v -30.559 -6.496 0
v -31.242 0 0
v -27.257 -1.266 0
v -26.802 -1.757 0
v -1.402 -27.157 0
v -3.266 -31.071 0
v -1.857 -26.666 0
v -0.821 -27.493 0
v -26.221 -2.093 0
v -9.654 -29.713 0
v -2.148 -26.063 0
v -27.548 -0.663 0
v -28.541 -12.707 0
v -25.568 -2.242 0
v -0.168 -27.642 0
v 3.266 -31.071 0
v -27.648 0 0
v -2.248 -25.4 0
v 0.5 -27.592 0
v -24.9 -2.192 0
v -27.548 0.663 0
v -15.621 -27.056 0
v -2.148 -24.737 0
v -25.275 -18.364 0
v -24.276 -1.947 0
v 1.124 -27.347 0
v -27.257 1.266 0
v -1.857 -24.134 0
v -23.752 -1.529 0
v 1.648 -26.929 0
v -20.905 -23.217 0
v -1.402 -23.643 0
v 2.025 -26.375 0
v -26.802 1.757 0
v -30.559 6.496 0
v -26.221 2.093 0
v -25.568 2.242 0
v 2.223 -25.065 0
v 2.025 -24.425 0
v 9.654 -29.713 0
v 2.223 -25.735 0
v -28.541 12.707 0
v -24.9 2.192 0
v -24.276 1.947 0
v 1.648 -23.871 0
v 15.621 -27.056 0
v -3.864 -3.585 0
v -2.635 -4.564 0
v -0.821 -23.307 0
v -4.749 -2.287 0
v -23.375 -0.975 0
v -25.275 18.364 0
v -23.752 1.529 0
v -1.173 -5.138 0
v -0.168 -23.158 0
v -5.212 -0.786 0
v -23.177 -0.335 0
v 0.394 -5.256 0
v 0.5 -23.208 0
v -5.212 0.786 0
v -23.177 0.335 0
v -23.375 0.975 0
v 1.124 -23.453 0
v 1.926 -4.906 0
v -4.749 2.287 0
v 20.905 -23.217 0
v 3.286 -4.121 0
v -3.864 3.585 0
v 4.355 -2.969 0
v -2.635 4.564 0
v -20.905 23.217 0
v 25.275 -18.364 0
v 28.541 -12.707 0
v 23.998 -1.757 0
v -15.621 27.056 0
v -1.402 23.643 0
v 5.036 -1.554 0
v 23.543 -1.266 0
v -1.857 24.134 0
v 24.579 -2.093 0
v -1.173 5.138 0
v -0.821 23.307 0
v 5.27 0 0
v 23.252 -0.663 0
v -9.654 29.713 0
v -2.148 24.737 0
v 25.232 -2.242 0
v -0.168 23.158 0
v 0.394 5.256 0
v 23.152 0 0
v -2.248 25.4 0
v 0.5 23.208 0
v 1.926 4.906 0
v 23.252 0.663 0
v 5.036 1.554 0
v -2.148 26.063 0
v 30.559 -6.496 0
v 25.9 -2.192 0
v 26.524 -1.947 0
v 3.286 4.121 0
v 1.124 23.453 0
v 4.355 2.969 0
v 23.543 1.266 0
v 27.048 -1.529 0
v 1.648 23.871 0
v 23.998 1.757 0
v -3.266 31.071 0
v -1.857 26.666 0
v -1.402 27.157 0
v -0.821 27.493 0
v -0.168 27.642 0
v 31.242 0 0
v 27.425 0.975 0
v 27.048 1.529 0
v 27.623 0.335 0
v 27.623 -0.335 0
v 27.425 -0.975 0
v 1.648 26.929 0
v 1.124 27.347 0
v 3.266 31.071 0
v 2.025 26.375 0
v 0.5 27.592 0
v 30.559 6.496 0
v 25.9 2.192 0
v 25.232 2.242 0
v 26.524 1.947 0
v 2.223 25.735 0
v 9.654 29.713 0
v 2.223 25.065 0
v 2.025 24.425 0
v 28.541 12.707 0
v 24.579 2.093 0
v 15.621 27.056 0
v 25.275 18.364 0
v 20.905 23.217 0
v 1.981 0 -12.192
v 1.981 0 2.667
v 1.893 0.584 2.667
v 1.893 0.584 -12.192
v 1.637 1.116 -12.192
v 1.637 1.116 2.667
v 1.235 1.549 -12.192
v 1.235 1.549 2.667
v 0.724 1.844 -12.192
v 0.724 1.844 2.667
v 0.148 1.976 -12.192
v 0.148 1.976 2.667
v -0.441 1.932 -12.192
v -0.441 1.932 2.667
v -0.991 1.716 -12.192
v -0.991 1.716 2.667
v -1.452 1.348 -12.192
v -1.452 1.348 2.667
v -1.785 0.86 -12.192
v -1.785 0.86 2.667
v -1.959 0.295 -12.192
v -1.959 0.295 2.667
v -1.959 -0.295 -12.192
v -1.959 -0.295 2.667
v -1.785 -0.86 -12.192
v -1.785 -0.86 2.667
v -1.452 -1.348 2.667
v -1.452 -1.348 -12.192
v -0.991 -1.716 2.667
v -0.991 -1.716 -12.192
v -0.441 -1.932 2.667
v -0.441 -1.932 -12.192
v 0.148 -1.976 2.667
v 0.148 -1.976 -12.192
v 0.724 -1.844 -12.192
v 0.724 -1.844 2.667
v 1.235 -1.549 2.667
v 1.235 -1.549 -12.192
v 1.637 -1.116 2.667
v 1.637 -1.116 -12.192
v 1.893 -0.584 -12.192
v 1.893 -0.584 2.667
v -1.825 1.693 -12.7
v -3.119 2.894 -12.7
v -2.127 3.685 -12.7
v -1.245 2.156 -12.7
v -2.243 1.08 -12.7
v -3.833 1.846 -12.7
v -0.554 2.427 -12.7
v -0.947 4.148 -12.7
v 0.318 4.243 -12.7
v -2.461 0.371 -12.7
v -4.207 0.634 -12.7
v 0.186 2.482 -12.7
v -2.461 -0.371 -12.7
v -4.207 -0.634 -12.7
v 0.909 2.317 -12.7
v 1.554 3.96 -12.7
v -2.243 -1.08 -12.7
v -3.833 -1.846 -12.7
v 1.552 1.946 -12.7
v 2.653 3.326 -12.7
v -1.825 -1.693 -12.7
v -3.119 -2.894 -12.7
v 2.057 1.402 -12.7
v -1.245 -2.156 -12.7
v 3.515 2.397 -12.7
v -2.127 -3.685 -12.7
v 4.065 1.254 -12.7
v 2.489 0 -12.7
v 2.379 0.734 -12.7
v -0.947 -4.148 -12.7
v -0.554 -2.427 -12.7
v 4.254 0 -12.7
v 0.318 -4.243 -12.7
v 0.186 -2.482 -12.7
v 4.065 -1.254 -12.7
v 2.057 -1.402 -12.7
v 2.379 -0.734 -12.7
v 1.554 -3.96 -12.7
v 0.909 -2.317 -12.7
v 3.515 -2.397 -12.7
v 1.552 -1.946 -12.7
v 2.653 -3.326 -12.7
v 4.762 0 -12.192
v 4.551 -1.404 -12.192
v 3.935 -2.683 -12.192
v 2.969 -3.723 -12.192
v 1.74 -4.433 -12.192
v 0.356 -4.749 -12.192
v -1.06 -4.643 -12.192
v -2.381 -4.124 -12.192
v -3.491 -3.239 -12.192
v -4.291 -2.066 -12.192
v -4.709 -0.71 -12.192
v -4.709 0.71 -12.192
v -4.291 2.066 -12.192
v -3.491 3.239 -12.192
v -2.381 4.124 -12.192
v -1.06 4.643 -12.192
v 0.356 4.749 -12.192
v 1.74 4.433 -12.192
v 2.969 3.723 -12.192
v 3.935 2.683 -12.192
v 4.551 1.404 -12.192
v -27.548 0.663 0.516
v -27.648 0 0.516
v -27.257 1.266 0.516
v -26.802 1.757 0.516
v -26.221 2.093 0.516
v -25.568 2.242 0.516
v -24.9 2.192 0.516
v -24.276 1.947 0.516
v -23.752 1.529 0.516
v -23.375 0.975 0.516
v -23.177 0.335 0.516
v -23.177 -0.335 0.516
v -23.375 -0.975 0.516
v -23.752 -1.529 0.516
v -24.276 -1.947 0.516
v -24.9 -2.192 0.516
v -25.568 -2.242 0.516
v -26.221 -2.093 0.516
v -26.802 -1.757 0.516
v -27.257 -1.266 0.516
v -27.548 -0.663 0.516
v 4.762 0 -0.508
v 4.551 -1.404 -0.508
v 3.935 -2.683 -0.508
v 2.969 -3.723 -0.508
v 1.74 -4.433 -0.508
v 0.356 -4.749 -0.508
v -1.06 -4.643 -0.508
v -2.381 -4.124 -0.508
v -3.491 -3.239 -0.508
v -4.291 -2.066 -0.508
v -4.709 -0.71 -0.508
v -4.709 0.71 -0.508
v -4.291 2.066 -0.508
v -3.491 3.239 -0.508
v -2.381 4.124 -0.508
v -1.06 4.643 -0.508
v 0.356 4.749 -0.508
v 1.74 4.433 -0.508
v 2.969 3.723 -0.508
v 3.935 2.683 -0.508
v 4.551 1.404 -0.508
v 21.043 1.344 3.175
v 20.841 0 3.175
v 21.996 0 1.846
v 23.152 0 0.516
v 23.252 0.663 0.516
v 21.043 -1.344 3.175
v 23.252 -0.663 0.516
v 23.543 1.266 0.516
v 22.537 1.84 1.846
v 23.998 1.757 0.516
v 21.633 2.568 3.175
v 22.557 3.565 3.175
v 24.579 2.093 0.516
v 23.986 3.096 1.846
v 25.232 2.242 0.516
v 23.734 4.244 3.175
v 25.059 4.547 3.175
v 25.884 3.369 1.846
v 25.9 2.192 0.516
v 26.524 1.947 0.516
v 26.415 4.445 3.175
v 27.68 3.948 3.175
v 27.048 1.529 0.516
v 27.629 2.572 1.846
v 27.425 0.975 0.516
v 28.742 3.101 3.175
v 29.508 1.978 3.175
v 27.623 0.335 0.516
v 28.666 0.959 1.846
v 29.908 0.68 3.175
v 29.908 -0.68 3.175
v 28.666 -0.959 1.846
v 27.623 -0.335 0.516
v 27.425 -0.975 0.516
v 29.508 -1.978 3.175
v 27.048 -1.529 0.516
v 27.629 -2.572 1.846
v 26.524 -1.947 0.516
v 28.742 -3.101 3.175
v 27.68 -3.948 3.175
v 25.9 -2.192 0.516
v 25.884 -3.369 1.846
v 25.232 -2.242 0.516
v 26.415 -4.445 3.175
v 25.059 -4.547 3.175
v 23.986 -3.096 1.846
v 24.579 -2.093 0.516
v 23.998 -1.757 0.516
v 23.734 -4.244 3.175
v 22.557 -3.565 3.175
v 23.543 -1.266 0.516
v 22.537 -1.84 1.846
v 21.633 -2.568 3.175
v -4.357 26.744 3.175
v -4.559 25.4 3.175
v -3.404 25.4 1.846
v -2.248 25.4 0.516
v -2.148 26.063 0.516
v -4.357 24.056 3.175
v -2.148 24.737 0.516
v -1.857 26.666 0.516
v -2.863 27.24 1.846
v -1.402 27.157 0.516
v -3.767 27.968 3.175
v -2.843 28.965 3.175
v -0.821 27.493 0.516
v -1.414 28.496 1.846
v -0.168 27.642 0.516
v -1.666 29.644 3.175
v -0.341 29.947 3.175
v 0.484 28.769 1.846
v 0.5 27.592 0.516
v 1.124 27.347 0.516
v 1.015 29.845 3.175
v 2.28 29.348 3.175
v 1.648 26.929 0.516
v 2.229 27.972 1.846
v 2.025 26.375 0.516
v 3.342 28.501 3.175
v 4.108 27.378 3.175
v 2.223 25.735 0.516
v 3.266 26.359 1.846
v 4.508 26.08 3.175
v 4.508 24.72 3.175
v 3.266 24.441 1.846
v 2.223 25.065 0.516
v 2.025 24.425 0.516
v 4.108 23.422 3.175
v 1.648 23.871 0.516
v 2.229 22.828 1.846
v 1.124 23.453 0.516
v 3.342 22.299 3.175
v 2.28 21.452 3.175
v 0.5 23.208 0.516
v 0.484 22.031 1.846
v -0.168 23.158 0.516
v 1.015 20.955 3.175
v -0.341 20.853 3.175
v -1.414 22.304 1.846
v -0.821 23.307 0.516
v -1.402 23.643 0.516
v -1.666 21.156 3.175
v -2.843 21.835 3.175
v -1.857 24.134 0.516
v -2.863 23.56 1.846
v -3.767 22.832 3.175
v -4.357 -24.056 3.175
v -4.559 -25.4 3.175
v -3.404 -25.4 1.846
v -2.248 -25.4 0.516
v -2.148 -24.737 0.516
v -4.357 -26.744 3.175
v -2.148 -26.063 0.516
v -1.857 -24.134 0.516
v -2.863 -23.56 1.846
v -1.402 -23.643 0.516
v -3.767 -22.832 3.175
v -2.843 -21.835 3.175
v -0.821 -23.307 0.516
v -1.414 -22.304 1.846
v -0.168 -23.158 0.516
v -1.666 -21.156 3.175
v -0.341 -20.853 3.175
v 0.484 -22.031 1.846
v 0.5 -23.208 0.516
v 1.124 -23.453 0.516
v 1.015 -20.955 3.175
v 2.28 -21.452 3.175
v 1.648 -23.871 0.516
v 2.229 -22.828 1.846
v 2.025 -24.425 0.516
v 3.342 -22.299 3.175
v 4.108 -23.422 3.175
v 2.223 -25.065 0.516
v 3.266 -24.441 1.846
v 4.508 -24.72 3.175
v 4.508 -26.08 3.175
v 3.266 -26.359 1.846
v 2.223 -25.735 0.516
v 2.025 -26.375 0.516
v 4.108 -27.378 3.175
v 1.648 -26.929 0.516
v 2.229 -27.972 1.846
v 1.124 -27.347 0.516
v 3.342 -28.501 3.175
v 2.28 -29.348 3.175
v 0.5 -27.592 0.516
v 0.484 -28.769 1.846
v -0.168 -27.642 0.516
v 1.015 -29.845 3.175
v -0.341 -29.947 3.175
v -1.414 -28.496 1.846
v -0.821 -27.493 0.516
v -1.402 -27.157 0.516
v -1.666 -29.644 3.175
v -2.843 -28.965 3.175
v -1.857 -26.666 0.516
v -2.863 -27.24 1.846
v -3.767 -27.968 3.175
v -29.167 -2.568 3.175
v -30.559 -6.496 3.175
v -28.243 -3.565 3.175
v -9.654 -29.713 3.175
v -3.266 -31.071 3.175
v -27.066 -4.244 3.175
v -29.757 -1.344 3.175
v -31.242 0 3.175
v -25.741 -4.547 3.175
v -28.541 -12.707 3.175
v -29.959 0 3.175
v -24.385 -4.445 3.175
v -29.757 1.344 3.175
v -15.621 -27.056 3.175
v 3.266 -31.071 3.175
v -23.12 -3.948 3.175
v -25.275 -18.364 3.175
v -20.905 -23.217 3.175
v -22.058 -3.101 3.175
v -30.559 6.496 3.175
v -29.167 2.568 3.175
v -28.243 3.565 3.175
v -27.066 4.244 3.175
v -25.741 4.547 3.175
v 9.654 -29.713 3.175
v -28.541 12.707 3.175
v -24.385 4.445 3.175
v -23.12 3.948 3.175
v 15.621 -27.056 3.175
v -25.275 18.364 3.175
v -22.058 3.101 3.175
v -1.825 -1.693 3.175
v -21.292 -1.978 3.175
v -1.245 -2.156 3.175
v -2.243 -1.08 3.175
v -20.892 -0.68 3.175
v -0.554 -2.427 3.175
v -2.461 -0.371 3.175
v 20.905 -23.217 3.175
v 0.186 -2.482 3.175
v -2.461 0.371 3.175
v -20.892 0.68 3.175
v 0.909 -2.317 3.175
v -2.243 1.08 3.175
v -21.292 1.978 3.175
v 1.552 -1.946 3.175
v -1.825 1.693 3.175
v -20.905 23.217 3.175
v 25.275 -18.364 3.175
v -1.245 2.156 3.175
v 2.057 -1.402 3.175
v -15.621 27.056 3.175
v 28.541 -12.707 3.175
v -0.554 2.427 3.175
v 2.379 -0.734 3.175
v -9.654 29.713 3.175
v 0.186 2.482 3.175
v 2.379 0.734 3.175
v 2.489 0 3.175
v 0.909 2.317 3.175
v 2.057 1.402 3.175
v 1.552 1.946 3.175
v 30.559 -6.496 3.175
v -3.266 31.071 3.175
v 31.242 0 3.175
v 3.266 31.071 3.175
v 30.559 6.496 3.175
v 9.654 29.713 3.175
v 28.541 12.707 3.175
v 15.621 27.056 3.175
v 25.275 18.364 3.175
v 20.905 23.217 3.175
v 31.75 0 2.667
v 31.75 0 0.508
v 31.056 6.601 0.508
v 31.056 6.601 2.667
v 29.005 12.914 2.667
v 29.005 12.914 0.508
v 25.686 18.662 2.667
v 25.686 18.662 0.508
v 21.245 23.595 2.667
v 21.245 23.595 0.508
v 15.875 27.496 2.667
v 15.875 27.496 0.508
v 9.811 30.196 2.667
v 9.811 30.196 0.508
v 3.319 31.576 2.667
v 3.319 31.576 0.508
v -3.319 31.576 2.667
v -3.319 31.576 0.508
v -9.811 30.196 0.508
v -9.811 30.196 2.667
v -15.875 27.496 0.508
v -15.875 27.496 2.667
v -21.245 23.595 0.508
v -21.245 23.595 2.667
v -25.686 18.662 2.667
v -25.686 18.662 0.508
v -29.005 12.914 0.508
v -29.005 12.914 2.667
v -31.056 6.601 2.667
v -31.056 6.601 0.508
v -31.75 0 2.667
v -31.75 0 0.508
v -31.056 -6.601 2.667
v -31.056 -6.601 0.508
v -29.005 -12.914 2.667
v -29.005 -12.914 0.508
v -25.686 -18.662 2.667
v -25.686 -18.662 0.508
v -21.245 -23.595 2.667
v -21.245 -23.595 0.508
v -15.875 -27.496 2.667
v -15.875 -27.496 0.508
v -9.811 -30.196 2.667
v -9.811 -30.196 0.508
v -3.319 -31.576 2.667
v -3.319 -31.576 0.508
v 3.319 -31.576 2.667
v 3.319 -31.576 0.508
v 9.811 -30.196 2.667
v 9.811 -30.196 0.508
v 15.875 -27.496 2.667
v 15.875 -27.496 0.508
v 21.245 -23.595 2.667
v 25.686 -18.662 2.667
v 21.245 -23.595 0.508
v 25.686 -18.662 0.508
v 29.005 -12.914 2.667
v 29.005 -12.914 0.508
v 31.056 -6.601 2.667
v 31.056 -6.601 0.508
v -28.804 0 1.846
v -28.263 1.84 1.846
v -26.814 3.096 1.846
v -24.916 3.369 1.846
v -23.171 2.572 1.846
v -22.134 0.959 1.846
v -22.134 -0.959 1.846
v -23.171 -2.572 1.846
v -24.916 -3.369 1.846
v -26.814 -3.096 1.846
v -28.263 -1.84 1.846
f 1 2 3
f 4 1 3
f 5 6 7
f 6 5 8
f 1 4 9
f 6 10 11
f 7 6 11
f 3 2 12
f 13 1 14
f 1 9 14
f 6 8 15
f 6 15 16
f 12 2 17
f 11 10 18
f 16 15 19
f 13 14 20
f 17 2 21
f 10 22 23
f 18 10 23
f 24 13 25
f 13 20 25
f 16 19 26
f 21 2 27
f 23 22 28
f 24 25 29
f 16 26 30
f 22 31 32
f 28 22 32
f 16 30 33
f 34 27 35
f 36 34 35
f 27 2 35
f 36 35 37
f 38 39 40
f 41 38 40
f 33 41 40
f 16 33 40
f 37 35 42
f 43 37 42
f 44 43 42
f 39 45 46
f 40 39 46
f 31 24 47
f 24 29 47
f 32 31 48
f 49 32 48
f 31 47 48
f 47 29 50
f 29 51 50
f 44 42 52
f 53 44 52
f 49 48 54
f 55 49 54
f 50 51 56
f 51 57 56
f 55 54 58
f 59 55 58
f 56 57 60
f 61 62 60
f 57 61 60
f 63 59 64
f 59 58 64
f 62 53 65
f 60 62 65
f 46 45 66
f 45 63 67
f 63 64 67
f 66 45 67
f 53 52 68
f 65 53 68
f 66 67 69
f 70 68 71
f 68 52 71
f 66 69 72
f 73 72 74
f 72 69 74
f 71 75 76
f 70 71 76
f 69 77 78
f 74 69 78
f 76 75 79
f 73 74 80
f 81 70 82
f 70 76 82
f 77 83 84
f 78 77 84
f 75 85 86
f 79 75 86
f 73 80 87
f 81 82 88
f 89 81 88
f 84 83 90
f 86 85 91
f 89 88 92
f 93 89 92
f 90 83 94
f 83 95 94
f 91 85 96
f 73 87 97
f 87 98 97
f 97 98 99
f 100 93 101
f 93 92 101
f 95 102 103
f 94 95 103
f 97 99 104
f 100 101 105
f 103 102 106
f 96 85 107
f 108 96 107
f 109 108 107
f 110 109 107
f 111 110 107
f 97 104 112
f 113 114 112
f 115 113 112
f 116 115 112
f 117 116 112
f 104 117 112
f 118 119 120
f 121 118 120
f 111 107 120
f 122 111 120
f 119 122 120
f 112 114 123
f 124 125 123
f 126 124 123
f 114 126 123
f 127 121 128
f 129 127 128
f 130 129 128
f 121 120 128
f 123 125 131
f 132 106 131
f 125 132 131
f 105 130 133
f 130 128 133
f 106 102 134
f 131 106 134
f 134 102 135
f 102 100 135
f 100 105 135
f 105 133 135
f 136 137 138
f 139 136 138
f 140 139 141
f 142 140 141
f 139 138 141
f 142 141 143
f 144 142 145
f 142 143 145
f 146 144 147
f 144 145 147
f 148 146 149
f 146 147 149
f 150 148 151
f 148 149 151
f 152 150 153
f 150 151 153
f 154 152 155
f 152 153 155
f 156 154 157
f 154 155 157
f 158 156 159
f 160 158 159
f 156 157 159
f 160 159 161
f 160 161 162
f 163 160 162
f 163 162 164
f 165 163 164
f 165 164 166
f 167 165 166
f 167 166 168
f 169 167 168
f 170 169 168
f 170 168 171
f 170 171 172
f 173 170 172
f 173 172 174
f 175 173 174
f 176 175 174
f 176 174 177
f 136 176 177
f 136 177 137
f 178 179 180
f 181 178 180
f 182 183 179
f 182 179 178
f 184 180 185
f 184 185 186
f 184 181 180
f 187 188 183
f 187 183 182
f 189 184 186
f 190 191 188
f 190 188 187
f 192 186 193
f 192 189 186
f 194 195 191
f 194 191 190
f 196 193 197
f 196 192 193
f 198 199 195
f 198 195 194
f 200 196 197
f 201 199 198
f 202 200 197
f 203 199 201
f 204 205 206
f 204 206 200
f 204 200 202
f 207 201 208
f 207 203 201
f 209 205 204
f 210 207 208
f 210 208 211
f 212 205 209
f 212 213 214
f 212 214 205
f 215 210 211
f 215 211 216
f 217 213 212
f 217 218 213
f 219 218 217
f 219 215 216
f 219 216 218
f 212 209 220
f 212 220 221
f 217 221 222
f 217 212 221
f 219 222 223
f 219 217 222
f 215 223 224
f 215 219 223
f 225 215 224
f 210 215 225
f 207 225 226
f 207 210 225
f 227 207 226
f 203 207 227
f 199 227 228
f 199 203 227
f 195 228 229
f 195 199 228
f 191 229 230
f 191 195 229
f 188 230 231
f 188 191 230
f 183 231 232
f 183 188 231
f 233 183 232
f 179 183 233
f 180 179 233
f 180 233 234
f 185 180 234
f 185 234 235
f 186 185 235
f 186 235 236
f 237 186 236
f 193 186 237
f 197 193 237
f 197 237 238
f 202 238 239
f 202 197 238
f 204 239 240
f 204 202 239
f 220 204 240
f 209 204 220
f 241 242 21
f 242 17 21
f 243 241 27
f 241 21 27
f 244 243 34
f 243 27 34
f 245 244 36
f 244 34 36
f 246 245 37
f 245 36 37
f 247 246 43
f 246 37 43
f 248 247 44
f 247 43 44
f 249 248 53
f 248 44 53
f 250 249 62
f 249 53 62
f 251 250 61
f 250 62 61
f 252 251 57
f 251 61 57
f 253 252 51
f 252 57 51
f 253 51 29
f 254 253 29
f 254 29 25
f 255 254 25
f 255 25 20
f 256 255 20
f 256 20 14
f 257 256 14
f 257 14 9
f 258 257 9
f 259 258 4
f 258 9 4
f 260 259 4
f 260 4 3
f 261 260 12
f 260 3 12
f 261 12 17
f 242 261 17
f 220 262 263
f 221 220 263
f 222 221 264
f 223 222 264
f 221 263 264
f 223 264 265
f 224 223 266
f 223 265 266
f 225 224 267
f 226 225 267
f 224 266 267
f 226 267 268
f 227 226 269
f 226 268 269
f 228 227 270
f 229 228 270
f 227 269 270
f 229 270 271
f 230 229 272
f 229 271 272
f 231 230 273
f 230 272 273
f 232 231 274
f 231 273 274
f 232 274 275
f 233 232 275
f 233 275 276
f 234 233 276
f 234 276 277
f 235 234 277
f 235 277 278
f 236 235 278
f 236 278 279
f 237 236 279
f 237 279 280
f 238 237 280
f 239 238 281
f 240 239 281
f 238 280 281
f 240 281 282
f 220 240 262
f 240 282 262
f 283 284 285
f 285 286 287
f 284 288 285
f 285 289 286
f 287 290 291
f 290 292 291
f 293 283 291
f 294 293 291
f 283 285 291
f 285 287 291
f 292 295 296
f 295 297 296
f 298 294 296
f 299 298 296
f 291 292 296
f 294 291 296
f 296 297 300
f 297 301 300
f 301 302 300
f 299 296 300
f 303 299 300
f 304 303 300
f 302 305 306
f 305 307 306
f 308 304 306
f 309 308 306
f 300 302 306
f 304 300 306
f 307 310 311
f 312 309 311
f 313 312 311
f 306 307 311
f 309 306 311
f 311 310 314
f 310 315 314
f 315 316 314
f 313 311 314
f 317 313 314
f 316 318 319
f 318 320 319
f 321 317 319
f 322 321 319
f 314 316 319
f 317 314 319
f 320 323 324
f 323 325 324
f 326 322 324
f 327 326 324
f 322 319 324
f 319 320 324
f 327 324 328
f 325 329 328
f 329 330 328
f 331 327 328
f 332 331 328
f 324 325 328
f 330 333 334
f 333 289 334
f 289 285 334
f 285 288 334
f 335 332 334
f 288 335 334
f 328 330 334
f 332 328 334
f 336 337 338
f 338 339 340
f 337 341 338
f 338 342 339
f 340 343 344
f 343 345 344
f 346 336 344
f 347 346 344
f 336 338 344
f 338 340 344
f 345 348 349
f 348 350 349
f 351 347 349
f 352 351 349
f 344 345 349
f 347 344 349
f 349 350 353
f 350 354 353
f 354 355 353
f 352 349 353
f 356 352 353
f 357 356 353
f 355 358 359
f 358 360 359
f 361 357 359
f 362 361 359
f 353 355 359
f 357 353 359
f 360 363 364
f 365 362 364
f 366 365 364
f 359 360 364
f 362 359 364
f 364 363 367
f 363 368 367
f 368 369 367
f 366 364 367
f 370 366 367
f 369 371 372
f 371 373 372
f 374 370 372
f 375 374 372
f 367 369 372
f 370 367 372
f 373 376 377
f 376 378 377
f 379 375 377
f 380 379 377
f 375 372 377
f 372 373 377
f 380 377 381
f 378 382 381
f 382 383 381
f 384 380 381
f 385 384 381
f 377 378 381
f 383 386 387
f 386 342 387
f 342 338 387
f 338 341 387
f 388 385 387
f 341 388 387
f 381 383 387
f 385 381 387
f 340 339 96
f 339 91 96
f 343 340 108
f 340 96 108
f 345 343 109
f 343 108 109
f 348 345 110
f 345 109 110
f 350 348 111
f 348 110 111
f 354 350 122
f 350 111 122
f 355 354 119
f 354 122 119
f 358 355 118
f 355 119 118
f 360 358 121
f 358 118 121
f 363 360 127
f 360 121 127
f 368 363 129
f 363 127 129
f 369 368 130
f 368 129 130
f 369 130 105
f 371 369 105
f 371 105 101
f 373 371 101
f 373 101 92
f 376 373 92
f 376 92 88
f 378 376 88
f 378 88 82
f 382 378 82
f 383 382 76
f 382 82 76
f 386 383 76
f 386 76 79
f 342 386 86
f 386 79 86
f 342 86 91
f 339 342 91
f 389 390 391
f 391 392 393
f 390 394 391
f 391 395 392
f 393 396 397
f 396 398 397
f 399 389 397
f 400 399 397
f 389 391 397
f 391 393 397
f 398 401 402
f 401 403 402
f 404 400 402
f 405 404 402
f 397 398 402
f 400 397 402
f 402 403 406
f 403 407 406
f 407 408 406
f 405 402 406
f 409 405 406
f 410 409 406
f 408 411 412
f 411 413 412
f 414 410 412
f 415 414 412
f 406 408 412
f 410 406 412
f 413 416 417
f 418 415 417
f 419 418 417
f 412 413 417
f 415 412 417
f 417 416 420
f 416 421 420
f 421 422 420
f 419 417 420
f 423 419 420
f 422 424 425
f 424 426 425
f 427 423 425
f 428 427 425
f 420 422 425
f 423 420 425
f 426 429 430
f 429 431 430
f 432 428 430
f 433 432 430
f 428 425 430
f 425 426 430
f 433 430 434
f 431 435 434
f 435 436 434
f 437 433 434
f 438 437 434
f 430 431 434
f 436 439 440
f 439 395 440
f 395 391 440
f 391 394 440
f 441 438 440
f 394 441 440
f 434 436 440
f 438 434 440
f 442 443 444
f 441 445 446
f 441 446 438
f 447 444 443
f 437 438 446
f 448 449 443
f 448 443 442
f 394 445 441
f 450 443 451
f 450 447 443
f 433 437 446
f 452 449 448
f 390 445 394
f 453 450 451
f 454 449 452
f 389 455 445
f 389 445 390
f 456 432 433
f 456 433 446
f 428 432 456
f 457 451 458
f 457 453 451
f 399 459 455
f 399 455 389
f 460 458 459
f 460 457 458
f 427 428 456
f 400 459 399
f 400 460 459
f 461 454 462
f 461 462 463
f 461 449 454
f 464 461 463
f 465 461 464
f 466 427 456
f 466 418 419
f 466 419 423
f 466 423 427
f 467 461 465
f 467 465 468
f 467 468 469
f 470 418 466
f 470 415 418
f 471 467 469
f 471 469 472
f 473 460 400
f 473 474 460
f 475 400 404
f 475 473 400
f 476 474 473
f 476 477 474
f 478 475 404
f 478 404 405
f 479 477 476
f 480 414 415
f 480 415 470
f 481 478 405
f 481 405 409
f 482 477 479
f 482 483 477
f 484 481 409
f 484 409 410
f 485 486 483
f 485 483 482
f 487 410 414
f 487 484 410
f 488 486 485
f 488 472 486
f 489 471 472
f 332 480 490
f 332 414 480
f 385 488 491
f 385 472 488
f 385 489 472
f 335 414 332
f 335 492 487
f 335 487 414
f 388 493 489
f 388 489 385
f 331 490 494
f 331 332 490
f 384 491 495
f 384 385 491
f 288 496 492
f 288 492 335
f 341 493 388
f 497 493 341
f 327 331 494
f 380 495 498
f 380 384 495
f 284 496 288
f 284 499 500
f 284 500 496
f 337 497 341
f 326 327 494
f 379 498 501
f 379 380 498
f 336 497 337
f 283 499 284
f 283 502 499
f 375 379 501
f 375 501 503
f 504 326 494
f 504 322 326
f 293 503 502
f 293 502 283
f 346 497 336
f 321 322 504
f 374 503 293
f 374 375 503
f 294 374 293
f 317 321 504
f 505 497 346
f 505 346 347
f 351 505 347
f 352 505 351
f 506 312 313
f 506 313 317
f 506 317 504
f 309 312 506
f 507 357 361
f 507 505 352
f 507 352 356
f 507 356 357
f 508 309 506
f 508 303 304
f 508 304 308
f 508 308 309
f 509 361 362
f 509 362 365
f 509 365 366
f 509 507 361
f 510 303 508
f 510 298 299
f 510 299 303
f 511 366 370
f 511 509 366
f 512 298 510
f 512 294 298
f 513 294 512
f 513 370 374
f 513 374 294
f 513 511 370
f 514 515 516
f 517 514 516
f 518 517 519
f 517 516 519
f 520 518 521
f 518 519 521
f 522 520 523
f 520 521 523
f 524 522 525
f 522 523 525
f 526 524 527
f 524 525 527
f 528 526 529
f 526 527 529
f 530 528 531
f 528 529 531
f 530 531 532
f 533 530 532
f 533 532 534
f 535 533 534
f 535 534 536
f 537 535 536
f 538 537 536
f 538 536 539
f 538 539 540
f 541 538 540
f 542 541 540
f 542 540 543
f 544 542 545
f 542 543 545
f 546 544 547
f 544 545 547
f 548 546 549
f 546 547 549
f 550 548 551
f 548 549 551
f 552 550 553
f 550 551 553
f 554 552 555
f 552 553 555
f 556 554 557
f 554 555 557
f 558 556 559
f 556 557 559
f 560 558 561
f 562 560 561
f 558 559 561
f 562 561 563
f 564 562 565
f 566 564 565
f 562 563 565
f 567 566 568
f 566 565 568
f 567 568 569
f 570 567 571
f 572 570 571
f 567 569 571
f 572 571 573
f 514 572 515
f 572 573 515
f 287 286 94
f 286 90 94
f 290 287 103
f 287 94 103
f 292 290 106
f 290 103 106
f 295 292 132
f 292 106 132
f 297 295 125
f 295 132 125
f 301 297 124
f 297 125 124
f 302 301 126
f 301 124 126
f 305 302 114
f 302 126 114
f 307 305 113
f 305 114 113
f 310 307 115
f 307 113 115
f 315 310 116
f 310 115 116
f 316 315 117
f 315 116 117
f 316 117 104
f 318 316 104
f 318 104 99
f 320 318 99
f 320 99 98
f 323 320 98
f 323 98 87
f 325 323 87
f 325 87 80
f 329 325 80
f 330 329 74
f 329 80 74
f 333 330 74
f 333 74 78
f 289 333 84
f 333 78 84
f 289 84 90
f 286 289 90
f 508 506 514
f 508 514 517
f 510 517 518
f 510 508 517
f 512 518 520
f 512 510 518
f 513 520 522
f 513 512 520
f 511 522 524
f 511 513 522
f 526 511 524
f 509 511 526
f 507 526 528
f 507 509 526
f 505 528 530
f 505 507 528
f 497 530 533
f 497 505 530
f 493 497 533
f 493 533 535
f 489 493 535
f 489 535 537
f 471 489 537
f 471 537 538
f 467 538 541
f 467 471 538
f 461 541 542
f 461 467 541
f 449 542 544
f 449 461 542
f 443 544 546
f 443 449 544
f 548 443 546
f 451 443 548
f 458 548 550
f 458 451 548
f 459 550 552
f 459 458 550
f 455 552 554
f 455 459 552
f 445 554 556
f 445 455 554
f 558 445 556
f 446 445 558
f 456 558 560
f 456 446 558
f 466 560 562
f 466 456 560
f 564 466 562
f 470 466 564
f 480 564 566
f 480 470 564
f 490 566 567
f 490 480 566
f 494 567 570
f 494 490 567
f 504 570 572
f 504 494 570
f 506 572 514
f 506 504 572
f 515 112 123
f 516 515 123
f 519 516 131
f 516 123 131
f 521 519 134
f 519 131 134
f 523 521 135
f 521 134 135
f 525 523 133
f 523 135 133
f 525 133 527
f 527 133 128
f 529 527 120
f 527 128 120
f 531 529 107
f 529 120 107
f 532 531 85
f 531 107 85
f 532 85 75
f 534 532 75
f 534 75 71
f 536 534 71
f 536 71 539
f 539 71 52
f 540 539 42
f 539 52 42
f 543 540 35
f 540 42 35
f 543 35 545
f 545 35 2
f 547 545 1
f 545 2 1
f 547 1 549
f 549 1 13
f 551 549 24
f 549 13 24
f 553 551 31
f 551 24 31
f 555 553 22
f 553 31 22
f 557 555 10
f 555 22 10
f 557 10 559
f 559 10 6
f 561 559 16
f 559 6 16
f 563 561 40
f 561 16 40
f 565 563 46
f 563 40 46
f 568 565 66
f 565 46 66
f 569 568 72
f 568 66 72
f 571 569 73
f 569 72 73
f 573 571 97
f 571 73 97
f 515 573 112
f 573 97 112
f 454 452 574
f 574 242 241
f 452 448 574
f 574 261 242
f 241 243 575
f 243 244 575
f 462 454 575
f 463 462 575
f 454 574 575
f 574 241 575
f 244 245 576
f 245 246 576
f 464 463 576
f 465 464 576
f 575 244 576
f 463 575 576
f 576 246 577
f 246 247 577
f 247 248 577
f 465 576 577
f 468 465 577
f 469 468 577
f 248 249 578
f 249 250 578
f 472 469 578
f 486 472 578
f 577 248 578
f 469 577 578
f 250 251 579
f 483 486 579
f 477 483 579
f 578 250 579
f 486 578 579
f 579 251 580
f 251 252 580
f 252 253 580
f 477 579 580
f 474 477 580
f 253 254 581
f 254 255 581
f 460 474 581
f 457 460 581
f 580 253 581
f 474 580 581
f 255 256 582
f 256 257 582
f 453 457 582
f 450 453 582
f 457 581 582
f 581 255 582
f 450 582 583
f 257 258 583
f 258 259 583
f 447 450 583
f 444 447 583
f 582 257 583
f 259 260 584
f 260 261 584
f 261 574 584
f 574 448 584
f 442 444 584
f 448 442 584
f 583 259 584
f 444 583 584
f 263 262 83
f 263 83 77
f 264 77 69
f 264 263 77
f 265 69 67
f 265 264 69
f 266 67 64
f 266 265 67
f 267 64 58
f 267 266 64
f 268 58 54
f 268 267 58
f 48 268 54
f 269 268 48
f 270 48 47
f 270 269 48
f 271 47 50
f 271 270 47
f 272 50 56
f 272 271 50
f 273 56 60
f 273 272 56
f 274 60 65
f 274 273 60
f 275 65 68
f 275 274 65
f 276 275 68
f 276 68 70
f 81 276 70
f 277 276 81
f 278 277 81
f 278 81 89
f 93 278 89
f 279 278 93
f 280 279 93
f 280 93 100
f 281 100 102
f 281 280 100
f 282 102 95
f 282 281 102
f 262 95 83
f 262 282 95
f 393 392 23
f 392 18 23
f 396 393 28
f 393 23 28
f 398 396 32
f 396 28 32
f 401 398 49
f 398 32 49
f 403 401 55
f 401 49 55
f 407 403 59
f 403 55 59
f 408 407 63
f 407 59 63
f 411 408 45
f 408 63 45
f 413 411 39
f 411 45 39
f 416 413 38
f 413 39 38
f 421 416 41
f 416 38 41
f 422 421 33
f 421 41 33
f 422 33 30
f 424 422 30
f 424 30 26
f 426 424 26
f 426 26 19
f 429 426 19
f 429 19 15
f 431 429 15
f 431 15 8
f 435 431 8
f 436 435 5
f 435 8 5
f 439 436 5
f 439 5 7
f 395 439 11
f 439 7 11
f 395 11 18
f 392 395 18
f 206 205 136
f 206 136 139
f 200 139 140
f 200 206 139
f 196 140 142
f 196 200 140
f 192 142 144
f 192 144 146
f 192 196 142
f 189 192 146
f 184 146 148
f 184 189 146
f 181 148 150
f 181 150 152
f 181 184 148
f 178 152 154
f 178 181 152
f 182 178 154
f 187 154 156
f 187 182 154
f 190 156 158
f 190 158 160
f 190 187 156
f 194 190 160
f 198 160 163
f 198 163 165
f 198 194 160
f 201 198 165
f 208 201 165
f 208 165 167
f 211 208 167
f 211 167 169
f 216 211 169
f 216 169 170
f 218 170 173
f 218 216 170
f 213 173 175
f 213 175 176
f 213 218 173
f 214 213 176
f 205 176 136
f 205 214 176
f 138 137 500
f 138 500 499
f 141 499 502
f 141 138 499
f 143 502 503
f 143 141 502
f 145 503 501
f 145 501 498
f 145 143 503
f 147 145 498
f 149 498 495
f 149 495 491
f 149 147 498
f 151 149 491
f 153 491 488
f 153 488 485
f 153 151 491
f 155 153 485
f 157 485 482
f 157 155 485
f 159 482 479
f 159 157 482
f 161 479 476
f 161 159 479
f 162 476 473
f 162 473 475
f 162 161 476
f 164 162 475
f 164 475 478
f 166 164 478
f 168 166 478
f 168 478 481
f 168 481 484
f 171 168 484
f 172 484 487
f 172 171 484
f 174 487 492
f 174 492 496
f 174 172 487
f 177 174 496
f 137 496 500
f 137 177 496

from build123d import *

# Parameters (mm, degrees)
F0_R           = 31.75
F1_DEPTH       = 3.175
F2_R           = 4.7625
F3_DEPTH       = 12.7
F5_D           = 4.4958
F5_CSINK_D     = 9.1186
F5_CSINK_ANGLE = 82
F6_R           = 1.9812
F7_DEPTH       = 15.876
F8_SIZE        = 0.508


with BuildPart() as f1:
    # F0 (on Top) → F1 (new body)
    with BuildSketch(Plane.XY):
        Circle(F0_R)
    extrude(amount=F1_DEPTH)

    # F2 (on face) → F3 (join)
    with BuildSketch(Plane(origin=(0, 0, 0), x_dir=(1, 0, 0), z_dir=(0, 0, -1))):
        Circle(F2_R)
    extrude(amount=F3_DEPTH)

    # F5 (through all)
    with Locations(Plane.XY.offset(3.175)):
        with Locations((-25.4, 0), (0, 25.4), (25.4, 0), (0, -25.4)):
            CounterSinkHole(F5_D / 2, F5_CSINK_D / 2, counter_sink_angle=F5_CSINK_ANGLE)

    # F6 (on face) → F7 (cut, through all)
    with BuildSketch(Plane.XY.offset(3.175)):
        Circle(F6_R)
    extrude(amount=-F7_DEPTH, mode=Mode.SUBTRACT)

    # F8
    f8_edges = [f1.edges().sort_by_distance(p)[0] for p in [
        (-31.75, 0, 3.175),
        (-1.9812, 0, 3.175),
        (-31.75, 0, 0),
        (-4.7625, 0, -12.7),
        (-1.9812, 0, -12.7),
        (-4.7625, 0, 0),
    ]]
    chamfer(f8_edges, length=F8_SIZE)


solid = f1.part
